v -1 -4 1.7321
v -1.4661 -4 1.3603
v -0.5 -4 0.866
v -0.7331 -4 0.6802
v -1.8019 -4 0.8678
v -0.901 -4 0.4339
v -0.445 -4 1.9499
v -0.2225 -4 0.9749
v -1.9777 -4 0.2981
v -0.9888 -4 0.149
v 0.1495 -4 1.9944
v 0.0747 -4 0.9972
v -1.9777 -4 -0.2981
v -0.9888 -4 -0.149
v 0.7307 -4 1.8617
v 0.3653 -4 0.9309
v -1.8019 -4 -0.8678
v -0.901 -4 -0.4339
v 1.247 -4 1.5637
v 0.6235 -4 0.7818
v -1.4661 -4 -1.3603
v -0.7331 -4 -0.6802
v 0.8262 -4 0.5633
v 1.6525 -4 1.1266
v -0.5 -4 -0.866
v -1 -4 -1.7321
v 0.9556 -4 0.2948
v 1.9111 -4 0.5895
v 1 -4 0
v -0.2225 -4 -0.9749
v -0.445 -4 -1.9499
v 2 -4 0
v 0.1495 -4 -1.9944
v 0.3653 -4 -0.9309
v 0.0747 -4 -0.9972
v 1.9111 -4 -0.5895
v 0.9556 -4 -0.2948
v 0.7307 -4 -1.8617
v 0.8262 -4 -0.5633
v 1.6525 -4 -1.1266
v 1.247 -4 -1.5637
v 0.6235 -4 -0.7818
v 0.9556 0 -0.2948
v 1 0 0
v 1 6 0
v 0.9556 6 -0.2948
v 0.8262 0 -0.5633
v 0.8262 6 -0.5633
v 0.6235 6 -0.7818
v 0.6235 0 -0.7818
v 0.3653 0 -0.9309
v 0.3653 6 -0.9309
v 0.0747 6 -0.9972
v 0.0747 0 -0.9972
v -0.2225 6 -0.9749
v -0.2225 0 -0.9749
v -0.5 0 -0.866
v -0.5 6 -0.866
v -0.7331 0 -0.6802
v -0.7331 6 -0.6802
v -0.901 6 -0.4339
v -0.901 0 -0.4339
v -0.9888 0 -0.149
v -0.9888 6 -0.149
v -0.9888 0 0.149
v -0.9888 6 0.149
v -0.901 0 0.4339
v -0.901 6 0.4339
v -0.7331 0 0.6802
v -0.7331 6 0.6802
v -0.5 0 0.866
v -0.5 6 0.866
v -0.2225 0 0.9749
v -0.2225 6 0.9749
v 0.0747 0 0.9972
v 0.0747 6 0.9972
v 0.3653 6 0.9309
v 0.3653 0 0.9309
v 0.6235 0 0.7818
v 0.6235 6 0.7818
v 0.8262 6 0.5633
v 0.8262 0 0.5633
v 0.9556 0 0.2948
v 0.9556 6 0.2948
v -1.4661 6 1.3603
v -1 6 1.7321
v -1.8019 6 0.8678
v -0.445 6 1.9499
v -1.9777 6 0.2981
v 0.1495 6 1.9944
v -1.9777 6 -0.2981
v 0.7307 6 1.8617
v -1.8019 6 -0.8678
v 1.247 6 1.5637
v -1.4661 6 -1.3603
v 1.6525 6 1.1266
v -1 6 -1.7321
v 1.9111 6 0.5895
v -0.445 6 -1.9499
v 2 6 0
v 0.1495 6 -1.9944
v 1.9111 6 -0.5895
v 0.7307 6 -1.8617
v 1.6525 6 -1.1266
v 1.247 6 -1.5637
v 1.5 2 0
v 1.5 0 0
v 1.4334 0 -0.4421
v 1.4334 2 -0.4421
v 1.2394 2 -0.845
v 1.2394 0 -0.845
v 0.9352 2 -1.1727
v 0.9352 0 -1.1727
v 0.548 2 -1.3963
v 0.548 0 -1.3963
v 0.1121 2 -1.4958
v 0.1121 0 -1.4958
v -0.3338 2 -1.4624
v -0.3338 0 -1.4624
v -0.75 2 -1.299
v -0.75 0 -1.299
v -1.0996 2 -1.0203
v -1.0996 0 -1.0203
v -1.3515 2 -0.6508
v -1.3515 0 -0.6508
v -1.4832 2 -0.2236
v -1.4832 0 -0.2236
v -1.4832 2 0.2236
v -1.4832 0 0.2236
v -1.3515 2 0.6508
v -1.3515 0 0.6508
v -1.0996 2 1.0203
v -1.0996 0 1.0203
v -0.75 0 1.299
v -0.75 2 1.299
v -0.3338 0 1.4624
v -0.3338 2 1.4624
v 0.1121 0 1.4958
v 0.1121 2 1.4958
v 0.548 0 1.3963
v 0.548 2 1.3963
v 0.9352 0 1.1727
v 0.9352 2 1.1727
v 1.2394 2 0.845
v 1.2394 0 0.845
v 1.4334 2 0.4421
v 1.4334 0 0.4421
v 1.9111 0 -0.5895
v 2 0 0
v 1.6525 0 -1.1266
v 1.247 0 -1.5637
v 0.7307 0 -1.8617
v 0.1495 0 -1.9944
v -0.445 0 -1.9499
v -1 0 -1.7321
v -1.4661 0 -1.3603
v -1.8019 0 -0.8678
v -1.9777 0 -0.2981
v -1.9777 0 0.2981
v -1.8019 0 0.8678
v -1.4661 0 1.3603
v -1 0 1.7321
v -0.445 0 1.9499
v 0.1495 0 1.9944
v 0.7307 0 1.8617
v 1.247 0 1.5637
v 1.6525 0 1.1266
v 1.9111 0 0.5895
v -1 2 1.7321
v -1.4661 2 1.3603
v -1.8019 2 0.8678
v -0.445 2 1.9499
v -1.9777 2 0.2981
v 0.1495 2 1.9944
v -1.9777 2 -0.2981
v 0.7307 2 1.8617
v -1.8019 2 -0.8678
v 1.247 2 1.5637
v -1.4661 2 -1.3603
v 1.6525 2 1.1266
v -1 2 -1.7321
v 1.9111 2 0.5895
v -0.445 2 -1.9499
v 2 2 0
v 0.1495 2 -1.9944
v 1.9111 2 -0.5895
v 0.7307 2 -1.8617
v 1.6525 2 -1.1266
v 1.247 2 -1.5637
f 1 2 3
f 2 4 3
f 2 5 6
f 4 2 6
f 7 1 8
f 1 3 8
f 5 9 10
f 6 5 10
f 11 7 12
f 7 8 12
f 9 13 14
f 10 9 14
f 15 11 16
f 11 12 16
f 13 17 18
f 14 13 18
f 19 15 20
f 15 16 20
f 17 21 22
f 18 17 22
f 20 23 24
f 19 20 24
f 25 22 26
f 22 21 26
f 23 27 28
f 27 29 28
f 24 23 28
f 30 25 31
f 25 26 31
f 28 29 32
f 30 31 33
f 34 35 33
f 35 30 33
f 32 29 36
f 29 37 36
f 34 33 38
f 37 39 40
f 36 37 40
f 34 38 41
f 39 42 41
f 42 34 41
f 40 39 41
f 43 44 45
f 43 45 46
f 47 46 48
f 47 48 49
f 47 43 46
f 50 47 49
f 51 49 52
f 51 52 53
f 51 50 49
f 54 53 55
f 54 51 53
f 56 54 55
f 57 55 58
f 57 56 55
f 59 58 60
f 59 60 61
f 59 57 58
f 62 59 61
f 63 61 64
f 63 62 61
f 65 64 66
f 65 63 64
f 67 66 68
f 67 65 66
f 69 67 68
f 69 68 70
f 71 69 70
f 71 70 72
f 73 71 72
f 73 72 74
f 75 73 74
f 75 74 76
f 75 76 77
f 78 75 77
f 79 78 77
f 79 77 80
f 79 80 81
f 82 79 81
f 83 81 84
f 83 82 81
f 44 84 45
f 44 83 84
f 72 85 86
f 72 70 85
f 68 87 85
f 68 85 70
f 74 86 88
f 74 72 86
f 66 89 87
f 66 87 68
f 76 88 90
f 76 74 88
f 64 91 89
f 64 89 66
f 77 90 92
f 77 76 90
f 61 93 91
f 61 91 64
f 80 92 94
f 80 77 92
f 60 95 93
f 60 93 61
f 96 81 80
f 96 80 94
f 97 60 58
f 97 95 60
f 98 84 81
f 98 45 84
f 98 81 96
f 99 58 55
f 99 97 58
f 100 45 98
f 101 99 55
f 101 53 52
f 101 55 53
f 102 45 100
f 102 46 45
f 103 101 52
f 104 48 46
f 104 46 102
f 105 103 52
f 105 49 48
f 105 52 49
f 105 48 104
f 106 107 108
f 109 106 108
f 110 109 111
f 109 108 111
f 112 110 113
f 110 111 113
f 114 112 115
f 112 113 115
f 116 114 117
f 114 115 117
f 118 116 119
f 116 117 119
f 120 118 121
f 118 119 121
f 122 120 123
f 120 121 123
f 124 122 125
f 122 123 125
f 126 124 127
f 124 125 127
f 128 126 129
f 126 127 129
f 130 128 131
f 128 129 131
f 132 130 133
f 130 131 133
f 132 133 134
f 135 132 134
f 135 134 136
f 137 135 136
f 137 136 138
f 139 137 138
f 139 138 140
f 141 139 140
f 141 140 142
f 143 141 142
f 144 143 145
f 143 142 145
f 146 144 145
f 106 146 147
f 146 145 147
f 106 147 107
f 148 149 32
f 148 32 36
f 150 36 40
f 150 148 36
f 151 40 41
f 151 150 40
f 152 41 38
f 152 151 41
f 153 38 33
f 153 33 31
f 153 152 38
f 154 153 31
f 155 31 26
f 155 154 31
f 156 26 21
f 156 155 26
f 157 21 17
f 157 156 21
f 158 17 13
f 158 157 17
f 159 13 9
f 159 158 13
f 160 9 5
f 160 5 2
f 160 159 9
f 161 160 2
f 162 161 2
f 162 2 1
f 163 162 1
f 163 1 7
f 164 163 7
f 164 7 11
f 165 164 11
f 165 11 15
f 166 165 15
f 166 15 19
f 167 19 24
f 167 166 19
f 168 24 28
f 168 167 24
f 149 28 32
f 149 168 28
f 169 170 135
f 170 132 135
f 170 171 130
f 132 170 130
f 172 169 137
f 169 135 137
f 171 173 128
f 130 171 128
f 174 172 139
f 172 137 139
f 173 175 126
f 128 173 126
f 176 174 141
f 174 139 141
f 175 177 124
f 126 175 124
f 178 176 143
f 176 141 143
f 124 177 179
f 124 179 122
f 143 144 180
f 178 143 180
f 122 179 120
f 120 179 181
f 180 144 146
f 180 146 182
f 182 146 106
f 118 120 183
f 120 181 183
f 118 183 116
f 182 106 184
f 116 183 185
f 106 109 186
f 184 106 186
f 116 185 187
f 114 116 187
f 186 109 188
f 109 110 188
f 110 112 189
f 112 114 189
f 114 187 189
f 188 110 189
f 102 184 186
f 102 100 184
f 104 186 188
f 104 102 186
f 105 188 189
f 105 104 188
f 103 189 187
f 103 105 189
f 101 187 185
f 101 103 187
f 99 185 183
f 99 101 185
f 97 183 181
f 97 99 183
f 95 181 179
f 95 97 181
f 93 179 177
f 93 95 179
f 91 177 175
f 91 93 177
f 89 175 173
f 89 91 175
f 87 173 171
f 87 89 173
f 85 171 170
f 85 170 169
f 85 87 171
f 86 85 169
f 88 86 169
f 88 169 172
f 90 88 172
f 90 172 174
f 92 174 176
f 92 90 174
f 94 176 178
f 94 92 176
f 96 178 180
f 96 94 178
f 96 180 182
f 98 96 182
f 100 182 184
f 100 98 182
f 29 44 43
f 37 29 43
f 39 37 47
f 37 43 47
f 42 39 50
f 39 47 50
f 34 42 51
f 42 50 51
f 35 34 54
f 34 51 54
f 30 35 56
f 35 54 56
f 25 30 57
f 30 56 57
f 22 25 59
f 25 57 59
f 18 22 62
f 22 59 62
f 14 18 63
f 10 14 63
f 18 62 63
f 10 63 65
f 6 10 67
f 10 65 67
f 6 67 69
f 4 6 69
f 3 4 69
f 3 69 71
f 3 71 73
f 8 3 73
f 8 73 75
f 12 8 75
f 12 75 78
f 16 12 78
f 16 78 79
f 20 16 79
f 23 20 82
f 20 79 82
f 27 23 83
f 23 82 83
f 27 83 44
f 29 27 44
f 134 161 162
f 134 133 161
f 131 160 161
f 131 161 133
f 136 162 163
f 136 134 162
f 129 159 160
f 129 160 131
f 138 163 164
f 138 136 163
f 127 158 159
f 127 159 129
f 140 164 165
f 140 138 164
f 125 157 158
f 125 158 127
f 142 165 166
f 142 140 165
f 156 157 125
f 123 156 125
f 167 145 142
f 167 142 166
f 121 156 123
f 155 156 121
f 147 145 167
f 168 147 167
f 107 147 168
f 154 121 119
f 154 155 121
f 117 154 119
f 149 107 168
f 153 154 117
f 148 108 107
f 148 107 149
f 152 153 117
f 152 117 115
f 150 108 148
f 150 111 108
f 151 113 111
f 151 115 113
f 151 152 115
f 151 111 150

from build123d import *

# Parameters (mm, degrees)
SKETCH_1_R           = 2
SKETCH_1_R_2         = 1
EXTRUDE_1_DEPTH      = 6
EXTRUDE_1_DEPTH_BACK = 4
SKETCH_2_R           = 2
SKETCH_2_R_2         = 1.5
CUT_EXTRUDE_1_DEPTH  = 2


with BuildPart() as part:
    # 草图1 → 凸台-拉伸1 (new body, two sides)
    with BuildSketch(Plane(origin=(0, 0, 0), x_dir=(1, 0, 0), z_dir=(0, 1, 0))) as extrude_1_sk:
        Circle(SKETCH_1_R)
        Circle(SKETCH_1_R_2, mode=Mode.SUBTRACT)
    extrude(amount=EXTRUDE_1_DEPTH)
    extrude(extrude_1_sk.sketch, amount=-EXTRUDE_1_DEPTH_BACK)

    # 草图2 → 切除-拉伸1 (cut)
    with BuildSketch(Plane(origin=(0, 0, 0), x_dir=(1, 0, 0), z_dir=(0, 1, 0))):
        Circle(SKETCH_2_R)
        Circle(SKETCH_2_R_2, mode=Mode.SUBTRACT)
    extrude(amount=CUT_EXTRUDE_1_DEPTH, mode=Mode.SUBTRACT)


solid = part.part
